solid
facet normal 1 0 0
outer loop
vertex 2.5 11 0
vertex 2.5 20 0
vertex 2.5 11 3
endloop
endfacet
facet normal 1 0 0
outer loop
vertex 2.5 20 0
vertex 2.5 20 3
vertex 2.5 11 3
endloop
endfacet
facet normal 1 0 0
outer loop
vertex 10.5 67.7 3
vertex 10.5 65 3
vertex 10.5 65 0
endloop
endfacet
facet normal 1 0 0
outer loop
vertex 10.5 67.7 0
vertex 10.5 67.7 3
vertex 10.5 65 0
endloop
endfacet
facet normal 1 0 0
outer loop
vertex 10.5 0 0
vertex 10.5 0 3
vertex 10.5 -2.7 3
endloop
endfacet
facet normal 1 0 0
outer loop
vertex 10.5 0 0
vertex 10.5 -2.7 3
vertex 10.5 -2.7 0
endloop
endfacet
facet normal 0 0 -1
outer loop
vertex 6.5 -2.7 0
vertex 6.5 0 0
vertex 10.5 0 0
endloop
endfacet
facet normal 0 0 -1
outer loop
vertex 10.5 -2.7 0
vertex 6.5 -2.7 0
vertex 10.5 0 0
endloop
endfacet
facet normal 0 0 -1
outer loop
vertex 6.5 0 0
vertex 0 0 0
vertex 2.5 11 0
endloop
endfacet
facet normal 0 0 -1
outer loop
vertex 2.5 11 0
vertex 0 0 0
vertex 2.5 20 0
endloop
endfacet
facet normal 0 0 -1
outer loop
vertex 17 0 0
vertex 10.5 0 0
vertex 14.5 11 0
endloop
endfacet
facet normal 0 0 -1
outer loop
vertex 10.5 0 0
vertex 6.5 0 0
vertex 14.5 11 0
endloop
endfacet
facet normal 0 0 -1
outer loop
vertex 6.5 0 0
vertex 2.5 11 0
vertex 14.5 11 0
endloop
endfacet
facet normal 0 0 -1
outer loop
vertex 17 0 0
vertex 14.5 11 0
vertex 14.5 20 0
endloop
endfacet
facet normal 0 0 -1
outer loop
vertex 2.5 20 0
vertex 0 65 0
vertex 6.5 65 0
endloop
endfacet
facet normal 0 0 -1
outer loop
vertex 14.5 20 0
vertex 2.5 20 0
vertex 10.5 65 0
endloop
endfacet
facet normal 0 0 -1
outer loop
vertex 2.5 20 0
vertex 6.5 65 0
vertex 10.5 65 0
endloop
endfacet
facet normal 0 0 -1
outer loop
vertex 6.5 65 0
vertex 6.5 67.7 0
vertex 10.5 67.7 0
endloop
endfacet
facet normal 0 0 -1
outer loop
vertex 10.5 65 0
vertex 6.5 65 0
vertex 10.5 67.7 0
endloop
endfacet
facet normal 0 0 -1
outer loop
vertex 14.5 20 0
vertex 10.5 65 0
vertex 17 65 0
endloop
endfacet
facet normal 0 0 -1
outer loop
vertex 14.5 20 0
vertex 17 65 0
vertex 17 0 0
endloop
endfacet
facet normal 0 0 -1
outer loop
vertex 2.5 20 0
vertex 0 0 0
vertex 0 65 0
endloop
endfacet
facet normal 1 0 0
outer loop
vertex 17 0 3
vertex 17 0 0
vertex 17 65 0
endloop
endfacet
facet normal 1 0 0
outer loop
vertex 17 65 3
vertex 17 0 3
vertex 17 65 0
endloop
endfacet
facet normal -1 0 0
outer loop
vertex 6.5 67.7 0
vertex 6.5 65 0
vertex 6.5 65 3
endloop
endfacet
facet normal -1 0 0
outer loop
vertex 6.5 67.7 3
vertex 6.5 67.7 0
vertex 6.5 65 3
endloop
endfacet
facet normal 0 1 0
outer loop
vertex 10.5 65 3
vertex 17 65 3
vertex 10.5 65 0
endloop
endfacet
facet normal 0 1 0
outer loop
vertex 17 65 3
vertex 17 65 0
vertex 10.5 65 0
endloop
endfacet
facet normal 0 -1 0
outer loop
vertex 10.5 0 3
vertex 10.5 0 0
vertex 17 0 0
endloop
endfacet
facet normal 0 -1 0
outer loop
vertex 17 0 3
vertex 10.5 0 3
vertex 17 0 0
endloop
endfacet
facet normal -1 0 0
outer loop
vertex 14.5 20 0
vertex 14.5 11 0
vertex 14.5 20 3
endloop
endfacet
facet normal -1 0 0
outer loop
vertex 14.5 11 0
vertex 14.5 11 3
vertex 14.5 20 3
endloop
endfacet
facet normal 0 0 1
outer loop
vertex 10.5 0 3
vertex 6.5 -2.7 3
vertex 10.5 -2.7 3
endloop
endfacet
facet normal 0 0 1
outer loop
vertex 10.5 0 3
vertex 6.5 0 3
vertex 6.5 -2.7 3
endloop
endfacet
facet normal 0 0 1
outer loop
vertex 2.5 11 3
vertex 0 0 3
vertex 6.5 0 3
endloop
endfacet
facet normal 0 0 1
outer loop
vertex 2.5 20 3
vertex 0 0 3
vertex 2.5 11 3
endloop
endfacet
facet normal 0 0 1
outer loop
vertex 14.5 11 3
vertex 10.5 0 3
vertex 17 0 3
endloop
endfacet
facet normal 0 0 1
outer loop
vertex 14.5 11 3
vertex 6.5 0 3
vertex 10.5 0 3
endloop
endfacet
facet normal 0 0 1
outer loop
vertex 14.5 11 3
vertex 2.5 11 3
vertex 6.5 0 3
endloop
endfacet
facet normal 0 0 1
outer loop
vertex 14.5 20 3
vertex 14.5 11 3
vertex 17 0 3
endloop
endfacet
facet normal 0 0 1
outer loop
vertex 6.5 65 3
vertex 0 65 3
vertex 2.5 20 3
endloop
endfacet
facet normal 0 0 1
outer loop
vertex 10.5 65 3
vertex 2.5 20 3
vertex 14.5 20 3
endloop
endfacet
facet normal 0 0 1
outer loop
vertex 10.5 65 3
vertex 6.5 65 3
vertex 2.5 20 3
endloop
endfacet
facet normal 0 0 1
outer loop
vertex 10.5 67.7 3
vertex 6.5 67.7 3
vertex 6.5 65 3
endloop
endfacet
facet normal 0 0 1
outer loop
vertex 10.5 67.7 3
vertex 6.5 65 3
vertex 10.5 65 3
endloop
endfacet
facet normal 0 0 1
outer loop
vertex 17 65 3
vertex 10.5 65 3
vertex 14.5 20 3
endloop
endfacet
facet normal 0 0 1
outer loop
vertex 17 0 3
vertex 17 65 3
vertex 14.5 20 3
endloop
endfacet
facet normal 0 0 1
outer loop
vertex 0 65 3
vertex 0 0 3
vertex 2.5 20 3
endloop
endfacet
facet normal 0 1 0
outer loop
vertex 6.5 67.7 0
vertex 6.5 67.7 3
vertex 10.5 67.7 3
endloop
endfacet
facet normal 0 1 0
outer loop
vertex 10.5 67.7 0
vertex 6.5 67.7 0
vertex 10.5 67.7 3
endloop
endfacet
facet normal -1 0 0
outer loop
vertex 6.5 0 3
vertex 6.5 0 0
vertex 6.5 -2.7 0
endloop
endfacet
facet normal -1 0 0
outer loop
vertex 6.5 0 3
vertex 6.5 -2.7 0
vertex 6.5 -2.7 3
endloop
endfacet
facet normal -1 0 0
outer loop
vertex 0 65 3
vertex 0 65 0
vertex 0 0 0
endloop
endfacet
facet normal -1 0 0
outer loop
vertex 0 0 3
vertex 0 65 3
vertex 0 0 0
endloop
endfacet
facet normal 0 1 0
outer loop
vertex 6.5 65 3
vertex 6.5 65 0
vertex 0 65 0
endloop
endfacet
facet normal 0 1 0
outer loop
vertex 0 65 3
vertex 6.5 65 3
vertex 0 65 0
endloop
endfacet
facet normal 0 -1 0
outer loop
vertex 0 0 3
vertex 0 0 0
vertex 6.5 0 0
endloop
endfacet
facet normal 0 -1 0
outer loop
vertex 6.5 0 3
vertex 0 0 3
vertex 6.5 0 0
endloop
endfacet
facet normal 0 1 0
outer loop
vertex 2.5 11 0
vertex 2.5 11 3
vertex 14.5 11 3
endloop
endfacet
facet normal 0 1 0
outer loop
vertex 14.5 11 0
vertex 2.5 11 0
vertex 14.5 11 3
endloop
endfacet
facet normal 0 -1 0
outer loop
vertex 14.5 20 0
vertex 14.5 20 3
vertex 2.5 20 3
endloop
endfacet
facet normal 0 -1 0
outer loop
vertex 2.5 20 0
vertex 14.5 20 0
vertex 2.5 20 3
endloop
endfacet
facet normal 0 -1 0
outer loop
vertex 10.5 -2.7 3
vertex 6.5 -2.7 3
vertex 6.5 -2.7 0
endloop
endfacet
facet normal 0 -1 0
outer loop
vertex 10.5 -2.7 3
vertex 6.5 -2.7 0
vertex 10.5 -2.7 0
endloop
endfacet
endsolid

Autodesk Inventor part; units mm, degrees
ref_plane "YZ Plane" through (0, 0, 0) normal (1, 0, 0) x (0, 1, 0)
ref_plane "XZ Plane" through (0, 0, 0) normal (0, 1, 0) x (-1, 0, 0)
ref_plane "XY Plane" through (0, 0, 0) normal (0, 0, 1) x (1, 0, 0)
sketch "Sketch1" plane through (0, 0, 0) normal (0, 0, 1) x (1, 0, 0)
  line L0 (0, 0) -> (17, 0)
  line L1 (17, 0) -> (17, 65)
  line L2 (17, 65) -> (0, 65)
  line L3 (0, 65) -> (0, 0)
  dimension "d0" = 17
  dimension "d1" = 65
  dimension "d2" = 17
extrude "Extrusion1" add sketch "Sketch1" along normal blind 3
sketch "Sketch2" plane through (0, 0, 3) normal (0, 0, 1) x (1, 0, 0)
  line L0 (0, 0) -> (17, 0) projected
  line L1 (8.5, 0) -> (8.5, 11)
  line L2 (8.5, 11) -> (14.5, 11)
  line L3 (14.5, 11) -> (14.5, 20)
  line L4 (14.5, 20) -> (2.5, 20)
  line L5 (2.5, 20) -> (2.5, 11)
  line L6 (2.5, 11) -> (8.5, 11)
  dimension "d5" = 11
  dimension "d6" = 6
  dimension "d7" = 9
  dimension "d8" = 12
  dimension "d9" = 9
extrude "Extrusion2" cut sketch "Sketch2" against normal blind 16.05
sketch "Sketch3" plane through (0, 0, 0) normal (0, -1, 0) x (1, 0, 0)
  line L0 (0, 0) -> (0, 3) projected
  line L1 (0, 1.5) -> (17, 1.5)
  line L2 (17, 0) -> (17, 3) projected
  line L3 (17, 3) -> (0, 3) projected
  line L4 (8.5, 3) -> (8.5, 0)
  line L5 (17, 0) -> (0, 0) projected
  line L6 (8.5, 1.5) -> (6.5, 1.5)
  line L7 (6.5, 1.5) -> (6.5, 3)
  line L8 (8.5, 1.5) -> (10.5, 1.5)
  line L9 (10.5, 1.5) -> (10.5, 0)
  line L10 (6.5, 3) -> (10.5, 3)
  line L11 (10.5, 3) -> (10.5, 0)
  line L12 (10.5, 0) -> (6.5, 0)
  line L13 (6.5, 0) -> (6.5, 3)
  dimension "d12" = 2
  dimension "d13" = 1.5
  dimension "d14" = 2
  dimension "d15" = 1.5
extrude "Extrusion3" add sketch "Sketch3" along normal blind 2.7 contours L13 L1 L4 L5 | L7 L3 L4 L1 | L4 L1 L9 L5 | L4 L3 L11 L1
extrude "Extrusion4" add sketch "Sketch3" against normal blind 2.7 from surface at -65 contours L13 L1 L4 L5 | L7 L3 L4 L1 | L4 L1 L9 L5 | L4 L3 L11 L1
properties part number "carcasa_piezaRadio_agujero_3.0"
